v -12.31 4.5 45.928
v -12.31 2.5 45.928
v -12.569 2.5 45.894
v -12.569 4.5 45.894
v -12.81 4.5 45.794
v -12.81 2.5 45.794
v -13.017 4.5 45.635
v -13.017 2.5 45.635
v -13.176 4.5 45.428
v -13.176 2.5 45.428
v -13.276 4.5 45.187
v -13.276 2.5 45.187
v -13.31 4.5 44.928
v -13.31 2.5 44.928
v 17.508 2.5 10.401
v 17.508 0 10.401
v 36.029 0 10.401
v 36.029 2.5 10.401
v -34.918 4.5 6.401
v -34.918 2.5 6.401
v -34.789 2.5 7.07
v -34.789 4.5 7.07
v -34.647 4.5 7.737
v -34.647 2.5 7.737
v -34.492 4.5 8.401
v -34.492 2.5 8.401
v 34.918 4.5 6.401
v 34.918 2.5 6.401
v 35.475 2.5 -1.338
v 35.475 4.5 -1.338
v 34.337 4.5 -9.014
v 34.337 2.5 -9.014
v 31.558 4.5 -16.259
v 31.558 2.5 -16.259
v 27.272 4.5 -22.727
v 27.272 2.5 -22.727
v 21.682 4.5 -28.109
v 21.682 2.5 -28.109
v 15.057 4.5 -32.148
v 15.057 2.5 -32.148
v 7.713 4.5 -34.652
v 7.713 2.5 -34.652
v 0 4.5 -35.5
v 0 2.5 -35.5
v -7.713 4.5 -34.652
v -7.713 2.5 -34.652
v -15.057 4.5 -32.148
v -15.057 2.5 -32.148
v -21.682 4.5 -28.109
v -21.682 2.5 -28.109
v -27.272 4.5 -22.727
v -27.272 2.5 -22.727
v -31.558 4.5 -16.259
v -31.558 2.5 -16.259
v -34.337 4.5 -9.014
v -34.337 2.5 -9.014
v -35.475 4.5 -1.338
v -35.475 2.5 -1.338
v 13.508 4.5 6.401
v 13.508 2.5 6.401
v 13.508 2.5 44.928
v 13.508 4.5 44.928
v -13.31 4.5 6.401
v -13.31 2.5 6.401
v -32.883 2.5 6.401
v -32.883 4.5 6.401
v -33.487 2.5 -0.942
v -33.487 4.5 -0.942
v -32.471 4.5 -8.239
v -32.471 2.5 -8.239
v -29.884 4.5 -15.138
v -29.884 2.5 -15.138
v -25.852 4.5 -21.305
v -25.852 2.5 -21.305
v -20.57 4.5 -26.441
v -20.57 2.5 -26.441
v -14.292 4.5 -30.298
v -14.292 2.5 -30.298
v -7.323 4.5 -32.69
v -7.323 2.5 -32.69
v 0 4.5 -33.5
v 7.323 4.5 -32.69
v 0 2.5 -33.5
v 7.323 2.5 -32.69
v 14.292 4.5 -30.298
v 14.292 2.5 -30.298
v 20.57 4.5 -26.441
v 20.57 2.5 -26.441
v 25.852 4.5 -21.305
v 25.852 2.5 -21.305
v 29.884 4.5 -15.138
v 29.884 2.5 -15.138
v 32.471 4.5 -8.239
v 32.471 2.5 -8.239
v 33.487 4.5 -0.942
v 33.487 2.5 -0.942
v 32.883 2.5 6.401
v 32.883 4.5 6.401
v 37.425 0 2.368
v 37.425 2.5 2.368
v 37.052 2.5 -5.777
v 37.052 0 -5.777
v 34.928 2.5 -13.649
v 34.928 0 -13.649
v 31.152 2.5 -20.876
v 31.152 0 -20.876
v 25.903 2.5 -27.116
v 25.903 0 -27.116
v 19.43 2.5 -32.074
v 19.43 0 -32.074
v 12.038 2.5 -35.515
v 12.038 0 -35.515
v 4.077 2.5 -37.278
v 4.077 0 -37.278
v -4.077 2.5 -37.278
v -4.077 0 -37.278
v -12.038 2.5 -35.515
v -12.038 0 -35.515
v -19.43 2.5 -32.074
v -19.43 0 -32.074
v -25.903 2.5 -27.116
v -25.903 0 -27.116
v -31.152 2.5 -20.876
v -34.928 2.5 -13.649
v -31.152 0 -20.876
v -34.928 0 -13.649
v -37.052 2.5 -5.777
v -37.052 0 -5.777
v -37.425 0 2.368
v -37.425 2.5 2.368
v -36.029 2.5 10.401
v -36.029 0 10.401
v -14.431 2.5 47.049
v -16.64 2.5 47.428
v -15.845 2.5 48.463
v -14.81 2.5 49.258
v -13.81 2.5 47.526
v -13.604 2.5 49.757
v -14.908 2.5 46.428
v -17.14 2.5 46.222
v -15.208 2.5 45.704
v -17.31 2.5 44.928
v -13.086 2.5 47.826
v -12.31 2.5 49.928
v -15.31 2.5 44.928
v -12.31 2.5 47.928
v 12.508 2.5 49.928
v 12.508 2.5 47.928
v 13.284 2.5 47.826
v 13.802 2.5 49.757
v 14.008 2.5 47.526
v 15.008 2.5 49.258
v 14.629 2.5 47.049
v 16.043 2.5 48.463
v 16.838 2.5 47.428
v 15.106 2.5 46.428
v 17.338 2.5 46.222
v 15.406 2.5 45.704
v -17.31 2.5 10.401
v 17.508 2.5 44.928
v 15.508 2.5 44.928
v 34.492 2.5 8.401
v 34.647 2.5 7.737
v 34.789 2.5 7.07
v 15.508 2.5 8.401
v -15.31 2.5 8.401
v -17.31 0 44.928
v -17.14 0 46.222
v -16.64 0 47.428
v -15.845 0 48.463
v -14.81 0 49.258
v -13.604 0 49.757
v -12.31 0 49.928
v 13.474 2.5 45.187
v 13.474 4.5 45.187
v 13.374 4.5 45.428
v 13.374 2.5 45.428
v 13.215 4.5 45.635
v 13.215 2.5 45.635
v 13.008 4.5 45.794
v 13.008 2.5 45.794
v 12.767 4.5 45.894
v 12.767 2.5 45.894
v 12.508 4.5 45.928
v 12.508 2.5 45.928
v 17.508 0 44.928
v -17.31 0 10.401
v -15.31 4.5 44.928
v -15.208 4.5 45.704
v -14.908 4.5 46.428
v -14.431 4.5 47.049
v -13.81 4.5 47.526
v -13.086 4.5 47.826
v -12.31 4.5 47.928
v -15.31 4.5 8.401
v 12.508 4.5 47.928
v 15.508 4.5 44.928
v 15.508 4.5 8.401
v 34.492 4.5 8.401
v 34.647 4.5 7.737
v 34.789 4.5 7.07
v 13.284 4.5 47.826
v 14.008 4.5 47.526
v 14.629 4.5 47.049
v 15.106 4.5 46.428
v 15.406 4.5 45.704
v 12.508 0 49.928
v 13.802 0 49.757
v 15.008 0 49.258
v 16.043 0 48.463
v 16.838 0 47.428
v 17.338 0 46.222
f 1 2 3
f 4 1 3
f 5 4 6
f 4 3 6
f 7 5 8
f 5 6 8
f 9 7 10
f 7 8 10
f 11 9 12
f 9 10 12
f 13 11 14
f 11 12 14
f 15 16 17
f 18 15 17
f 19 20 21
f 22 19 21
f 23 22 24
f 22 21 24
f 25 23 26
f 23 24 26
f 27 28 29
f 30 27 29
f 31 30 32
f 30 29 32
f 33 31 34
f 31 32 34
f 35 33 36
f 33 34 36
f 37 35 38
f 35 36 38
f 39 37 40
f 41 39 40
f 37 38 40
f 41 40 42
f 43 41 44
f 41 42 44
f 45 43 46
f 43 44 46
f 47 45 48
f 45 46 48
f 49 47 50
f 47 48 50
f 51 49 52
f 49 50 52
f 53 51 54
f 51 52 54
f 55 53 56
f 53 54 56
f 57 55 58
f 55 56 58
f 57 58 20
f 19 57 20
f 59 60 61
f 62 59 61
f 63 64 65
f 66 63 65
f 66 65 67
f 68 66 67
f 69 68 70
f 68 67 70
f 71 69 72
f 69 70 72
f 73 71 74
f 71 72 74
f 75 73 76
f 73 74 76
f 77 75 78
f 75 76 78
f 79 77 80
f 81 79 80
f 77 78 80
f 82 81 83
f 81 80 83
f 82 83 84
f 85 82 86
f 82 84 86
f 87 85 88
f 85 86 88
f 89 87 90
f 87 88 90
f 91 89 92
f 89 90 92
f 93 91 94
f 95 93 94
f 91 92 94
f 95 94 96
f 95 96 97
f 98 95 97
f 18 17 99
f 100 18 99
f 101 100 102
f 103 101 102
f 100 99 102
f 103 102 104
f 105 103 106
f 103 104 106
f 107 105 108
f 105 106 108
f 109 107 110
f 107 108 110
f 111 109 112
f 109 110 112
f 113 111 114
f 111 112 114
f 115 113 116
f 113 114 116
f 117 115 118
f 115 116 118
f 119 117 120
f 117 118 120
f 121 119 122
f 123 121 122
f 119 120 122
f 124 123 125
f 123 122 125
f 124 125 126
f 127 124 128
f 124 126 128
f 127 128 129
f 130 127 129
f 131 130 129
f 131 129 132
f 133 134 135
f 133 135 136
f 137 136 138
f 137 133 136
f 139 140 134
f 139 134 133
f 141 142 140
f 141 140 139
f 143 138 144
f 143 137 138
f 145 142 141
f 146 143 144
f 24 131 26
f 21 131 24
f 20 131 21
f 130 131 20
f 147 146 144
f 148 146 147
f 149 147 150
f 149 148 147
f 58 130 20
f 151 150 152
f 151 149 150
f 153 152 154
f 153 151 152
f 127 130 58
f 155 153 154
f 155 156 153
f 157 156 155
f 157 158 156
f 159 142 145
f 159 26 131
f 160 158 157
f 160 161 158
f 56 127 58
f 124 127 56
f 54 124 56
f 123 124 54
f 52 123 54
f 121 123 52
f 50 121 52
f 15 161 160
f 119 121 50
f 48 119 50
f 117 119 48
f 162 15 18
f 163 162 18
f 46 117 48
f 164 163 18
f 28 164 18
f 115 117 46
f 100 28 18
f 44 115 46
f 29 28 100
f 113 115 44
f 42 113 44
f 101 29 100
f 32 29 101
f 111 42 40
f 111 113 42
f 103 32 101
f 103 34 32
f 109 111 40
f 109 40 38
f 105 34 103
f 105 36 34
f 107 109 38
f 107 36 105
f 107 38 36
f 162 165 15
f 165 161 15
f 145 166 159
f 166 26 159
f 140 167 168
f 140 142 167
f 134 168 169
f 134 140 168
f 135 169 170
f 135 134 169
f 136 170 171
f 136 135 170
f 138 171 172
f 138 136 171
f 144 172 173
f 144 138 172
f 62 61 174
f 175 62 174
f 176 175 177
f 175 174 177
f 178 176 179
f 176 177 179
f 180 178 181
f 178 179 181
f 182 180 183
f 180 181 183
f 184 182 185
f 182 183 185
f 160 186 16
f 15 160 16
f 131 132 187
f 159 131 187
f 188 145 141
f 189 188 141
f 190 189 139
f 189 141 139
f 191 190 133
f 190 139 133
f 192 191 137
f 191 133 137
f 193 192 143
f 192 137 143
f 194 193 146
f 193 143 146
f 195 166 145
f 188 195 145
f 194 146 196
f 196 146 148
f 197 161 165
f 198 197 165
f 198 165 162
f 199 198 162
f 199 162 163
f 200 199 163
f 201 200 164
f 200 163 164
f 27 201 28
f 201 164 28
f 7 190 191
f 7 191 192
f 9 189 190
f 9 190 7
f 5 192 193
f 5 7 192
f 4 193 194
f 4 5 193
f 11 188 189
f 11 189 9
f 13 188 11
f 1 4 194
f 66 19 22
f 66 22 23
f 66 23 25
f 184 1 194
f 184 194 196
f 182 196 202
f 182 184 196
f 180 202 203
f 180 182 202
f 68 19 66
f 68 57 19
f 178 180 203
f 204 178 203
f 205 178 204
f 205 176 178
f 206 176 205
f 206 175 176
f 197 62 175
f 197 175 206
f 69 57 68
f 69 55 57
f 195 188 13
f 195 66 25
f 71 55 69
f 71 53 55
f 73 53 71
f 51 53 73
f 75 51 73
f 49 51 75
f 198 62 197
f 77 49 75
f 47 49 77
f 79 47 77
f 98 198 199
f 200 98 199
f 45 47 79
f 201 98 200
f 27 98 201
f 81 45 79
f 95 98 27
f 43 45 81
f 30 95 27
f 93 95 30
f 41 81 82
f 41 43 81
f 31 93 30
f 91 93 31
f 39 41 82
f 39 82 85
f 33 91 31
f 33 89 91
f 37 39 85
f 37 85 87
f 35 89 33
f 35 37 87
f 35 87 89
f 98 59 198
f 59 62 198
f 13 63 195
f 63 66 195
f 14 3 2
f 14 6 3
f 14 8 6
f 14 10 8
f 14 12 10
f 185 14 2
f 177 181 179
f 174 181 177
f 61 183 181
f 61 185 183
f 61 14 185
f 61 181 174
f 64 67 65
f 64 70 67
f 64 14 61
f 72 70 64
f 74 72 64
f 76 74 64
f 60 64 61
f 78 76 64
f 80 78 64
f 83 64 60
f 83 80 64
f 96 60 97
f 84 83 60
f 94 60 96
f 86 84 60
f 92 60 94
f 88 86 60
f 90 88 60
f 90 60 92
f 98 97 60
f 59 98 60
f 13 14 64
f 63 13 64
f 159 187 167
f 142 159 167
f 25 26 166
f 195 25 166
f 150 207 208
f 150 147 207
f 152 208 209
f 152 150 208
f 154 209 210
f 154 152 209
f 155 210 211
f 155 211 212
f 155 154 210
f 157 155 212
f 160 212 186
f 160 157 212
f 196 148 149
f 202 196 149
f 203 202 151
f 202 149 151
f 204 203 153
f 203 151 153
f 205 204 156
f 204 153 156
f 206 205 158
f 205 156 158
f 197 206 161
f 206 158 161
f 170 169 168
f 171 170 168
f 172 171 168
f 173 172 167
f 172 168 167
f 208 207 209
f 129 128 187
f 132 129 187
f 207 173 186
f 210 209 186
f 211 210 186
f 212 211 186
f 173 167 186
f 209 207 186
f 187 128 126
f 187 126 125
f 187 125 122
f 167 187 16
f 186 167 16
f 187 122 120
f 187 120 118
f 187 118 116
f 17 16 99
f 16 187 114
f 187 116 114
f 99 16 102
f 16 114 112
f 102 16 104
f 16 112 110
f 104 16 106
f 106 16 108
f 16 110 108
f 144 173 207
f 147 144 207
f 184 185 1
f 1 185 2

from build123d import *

# Parameters (mm, degrees)
SALIENTE_EXTRUIR1_DEPTH = 2.5
REDONDEO1_R             = 5
REDONDEO2_R             = 5
SALIENTE_EXTRUIR3_DEPTH = 2


with BuildPart() as part:
    # Croquis1 → Saliente-Extruir1 (new body)
    with BuildSketch(Plane(origin=(0, 0, 0), x_dir=(1, 0, 0), z_dir=(0, 1, 0))):
        with BuildLine():
            Line((-36.028689226, -10.401132279), (-17.309933046, -10.401132279))
            Line((-17.309933046, -10.401132279), (-17.309933046, -49.927805962))
            Line((-17.309933046, -49.927805962), (17.507919263, -49.927805962))
            Line((17.507919263, -49.927805962), (17.507919263, -10.401132279))
            Line((17.507919263, -10.401132279), (36.028689226, -10.401132279))
            ThreePointArc((36.028689226, -10.401132279), (0, 37.5), (-36.028689226, -10.401132279))
        make_face()
    extrude(amount=SALIENTE_EXTRUIR1_DEPTH)

    # Redondeo1
    redondeo1_edges = [part.edges().sort_by_distance(p)[0] for p in [
        (-17.309933046, 1.25, 49.927805962),
    ]]
    fillet(redondeo1_edges, radius=REDONDEO1_R)

    # Redondeo2
    redondeo2_edges = [part.edges().sort_by_distance(p)[0] for p in [
        (17.507919263, 1.25, 49.927805962),
    ]]
    fillet(redondeo2_edges, radius=REDONDEO2_R)

    # Croquis2 → Saliente-Extruir3 (add)
    with BuildSketch(Plane(origin=(0, 2.5, 0), x_dir=(1, 0, 0), z_dir=(0, 1, 0))):
        with BuildLine():
            ThreePointArc((-32.429476968, -8.401132279), (-32.671422926, -7.404601543), (-32.882753923, -6.401132279))
            Line((-32.882753923, -6.401132279), (-34.918125745, -6.401132279))
            ThreePointArc((-34.918125745, -6.401132279), (-34.719270751, -7.40420411), (-34.491607333, -8.401132279))
            Line((-34.491607333, -8.401132279), (-32.429476968, -8.401132279))
        make_face()
        with BuildLine():
            Line((17.507919263, -6.401132279), (13.507919263, -6.401132279))
            Line((13.507919263, -6.401132279), (13.507919263, -8.401132279))
            Line((13.507919263, -8.401132279), (13.507919263, -44.927805962))
            ThreePointArc((13.507919263, -44.927805962), (13.215026044, -45.634912744), (12.507919263, -45.927805962))
            Line((12.507919263, -45.927805962), (-12.309933046, -45.927805962))
            ThreePointArc((-12.309933046, -45.927805962), (-13.017039827, -45.634912744), (-13.309933046, -44.927805962))
            Line((-13.309933046, -44.927805962), (-13.309933046, -10.401132279))
            Line((-13.309933046, -10.401132279), (-13.309933046, -6.401132279))
            Line((-13.309933046, -6.401132279), (-17.309933046, -6.401132279))
            Line((-17.309933046, -6.401132279), (-32.882753923, -6.401132279))
            ThreePointArc((-32.882753923, -6.401132279), (-32.671422926, -7.404601543), (-32.429476968, -8.401132279))
            Line((-32.429476968, -8.401132279), (-17.309933046, -8.401132279))
            Line((-17.309933046, -8.401132279), (-15.309933046, -8.401132279))
            Line((-15.309933046, -8.401132279), (-15.309933046, -10.401132279))
            Line((-15.309933046, -10.401132279), (-15.309933046, -44.927805962))
            ThreePointArc((-15.309933046, -44.927805962), (-14.43125339, -47.049126306), (-12.309933046, -47.927805962))
            Line((-12.309933046, -47.927805962), (12.507919263, -47.927805962))
            ThreePointArc((12.507919263, -47.927805962), (14.629239607, -47.049126306), (15.507919263, -44.927805962))
            Line((15.507919263, -44.927805962), (15.507919263, -8.401132279))
            Line((15.507919263, -8.401132279), (17.507919263, -8.401132279))
            Line((17.507919263, -8.401132279), (32.429476968, -8.401132279))
            ThreePointArc((32.429476968, -8.401132279), (32.671422926, -7.404601543), (32.882753923, -6.401132279))
            Line((32.882753923, -6.401132279), (17.507919263, -6.401132279))
        make_face()
        with BuildLine():
            Line((34.918125745, -6.401132279), (32.882753923, -6.401132279))
            ThreePointArc((32.882753923, -6.401132279), (32.671422926, -7.404601543), (32.429476968, -8.401132279))
            Line((32.429476968, -8.401132279), (34.491607333, -8.401132279))
            ThreePointArc((34.491607333, -8.401132279), (34.719270751, -7.40420411), (34.918125745, -6.401132279))
        make_face()
        with BuildLine():
            ThreePointArc((-32.882753923, -6.401132279), (0, 33.5), (32.882753923, -6.401132279))
            Line((32.882753923, -6.401132279), (34.918125745, -6.401132279))
            ThreePointArc((34.918125745, -6.401132279), (0, 35.5), (-34.918125745, -6.401132279))
            Line((-34.918125745, -6.401132279), (-32.882753923, -6.401132279))
        make_face()
    extrude(amount=SALIENTE_EXTRUIR3_DEPTH)


solid = part.part
